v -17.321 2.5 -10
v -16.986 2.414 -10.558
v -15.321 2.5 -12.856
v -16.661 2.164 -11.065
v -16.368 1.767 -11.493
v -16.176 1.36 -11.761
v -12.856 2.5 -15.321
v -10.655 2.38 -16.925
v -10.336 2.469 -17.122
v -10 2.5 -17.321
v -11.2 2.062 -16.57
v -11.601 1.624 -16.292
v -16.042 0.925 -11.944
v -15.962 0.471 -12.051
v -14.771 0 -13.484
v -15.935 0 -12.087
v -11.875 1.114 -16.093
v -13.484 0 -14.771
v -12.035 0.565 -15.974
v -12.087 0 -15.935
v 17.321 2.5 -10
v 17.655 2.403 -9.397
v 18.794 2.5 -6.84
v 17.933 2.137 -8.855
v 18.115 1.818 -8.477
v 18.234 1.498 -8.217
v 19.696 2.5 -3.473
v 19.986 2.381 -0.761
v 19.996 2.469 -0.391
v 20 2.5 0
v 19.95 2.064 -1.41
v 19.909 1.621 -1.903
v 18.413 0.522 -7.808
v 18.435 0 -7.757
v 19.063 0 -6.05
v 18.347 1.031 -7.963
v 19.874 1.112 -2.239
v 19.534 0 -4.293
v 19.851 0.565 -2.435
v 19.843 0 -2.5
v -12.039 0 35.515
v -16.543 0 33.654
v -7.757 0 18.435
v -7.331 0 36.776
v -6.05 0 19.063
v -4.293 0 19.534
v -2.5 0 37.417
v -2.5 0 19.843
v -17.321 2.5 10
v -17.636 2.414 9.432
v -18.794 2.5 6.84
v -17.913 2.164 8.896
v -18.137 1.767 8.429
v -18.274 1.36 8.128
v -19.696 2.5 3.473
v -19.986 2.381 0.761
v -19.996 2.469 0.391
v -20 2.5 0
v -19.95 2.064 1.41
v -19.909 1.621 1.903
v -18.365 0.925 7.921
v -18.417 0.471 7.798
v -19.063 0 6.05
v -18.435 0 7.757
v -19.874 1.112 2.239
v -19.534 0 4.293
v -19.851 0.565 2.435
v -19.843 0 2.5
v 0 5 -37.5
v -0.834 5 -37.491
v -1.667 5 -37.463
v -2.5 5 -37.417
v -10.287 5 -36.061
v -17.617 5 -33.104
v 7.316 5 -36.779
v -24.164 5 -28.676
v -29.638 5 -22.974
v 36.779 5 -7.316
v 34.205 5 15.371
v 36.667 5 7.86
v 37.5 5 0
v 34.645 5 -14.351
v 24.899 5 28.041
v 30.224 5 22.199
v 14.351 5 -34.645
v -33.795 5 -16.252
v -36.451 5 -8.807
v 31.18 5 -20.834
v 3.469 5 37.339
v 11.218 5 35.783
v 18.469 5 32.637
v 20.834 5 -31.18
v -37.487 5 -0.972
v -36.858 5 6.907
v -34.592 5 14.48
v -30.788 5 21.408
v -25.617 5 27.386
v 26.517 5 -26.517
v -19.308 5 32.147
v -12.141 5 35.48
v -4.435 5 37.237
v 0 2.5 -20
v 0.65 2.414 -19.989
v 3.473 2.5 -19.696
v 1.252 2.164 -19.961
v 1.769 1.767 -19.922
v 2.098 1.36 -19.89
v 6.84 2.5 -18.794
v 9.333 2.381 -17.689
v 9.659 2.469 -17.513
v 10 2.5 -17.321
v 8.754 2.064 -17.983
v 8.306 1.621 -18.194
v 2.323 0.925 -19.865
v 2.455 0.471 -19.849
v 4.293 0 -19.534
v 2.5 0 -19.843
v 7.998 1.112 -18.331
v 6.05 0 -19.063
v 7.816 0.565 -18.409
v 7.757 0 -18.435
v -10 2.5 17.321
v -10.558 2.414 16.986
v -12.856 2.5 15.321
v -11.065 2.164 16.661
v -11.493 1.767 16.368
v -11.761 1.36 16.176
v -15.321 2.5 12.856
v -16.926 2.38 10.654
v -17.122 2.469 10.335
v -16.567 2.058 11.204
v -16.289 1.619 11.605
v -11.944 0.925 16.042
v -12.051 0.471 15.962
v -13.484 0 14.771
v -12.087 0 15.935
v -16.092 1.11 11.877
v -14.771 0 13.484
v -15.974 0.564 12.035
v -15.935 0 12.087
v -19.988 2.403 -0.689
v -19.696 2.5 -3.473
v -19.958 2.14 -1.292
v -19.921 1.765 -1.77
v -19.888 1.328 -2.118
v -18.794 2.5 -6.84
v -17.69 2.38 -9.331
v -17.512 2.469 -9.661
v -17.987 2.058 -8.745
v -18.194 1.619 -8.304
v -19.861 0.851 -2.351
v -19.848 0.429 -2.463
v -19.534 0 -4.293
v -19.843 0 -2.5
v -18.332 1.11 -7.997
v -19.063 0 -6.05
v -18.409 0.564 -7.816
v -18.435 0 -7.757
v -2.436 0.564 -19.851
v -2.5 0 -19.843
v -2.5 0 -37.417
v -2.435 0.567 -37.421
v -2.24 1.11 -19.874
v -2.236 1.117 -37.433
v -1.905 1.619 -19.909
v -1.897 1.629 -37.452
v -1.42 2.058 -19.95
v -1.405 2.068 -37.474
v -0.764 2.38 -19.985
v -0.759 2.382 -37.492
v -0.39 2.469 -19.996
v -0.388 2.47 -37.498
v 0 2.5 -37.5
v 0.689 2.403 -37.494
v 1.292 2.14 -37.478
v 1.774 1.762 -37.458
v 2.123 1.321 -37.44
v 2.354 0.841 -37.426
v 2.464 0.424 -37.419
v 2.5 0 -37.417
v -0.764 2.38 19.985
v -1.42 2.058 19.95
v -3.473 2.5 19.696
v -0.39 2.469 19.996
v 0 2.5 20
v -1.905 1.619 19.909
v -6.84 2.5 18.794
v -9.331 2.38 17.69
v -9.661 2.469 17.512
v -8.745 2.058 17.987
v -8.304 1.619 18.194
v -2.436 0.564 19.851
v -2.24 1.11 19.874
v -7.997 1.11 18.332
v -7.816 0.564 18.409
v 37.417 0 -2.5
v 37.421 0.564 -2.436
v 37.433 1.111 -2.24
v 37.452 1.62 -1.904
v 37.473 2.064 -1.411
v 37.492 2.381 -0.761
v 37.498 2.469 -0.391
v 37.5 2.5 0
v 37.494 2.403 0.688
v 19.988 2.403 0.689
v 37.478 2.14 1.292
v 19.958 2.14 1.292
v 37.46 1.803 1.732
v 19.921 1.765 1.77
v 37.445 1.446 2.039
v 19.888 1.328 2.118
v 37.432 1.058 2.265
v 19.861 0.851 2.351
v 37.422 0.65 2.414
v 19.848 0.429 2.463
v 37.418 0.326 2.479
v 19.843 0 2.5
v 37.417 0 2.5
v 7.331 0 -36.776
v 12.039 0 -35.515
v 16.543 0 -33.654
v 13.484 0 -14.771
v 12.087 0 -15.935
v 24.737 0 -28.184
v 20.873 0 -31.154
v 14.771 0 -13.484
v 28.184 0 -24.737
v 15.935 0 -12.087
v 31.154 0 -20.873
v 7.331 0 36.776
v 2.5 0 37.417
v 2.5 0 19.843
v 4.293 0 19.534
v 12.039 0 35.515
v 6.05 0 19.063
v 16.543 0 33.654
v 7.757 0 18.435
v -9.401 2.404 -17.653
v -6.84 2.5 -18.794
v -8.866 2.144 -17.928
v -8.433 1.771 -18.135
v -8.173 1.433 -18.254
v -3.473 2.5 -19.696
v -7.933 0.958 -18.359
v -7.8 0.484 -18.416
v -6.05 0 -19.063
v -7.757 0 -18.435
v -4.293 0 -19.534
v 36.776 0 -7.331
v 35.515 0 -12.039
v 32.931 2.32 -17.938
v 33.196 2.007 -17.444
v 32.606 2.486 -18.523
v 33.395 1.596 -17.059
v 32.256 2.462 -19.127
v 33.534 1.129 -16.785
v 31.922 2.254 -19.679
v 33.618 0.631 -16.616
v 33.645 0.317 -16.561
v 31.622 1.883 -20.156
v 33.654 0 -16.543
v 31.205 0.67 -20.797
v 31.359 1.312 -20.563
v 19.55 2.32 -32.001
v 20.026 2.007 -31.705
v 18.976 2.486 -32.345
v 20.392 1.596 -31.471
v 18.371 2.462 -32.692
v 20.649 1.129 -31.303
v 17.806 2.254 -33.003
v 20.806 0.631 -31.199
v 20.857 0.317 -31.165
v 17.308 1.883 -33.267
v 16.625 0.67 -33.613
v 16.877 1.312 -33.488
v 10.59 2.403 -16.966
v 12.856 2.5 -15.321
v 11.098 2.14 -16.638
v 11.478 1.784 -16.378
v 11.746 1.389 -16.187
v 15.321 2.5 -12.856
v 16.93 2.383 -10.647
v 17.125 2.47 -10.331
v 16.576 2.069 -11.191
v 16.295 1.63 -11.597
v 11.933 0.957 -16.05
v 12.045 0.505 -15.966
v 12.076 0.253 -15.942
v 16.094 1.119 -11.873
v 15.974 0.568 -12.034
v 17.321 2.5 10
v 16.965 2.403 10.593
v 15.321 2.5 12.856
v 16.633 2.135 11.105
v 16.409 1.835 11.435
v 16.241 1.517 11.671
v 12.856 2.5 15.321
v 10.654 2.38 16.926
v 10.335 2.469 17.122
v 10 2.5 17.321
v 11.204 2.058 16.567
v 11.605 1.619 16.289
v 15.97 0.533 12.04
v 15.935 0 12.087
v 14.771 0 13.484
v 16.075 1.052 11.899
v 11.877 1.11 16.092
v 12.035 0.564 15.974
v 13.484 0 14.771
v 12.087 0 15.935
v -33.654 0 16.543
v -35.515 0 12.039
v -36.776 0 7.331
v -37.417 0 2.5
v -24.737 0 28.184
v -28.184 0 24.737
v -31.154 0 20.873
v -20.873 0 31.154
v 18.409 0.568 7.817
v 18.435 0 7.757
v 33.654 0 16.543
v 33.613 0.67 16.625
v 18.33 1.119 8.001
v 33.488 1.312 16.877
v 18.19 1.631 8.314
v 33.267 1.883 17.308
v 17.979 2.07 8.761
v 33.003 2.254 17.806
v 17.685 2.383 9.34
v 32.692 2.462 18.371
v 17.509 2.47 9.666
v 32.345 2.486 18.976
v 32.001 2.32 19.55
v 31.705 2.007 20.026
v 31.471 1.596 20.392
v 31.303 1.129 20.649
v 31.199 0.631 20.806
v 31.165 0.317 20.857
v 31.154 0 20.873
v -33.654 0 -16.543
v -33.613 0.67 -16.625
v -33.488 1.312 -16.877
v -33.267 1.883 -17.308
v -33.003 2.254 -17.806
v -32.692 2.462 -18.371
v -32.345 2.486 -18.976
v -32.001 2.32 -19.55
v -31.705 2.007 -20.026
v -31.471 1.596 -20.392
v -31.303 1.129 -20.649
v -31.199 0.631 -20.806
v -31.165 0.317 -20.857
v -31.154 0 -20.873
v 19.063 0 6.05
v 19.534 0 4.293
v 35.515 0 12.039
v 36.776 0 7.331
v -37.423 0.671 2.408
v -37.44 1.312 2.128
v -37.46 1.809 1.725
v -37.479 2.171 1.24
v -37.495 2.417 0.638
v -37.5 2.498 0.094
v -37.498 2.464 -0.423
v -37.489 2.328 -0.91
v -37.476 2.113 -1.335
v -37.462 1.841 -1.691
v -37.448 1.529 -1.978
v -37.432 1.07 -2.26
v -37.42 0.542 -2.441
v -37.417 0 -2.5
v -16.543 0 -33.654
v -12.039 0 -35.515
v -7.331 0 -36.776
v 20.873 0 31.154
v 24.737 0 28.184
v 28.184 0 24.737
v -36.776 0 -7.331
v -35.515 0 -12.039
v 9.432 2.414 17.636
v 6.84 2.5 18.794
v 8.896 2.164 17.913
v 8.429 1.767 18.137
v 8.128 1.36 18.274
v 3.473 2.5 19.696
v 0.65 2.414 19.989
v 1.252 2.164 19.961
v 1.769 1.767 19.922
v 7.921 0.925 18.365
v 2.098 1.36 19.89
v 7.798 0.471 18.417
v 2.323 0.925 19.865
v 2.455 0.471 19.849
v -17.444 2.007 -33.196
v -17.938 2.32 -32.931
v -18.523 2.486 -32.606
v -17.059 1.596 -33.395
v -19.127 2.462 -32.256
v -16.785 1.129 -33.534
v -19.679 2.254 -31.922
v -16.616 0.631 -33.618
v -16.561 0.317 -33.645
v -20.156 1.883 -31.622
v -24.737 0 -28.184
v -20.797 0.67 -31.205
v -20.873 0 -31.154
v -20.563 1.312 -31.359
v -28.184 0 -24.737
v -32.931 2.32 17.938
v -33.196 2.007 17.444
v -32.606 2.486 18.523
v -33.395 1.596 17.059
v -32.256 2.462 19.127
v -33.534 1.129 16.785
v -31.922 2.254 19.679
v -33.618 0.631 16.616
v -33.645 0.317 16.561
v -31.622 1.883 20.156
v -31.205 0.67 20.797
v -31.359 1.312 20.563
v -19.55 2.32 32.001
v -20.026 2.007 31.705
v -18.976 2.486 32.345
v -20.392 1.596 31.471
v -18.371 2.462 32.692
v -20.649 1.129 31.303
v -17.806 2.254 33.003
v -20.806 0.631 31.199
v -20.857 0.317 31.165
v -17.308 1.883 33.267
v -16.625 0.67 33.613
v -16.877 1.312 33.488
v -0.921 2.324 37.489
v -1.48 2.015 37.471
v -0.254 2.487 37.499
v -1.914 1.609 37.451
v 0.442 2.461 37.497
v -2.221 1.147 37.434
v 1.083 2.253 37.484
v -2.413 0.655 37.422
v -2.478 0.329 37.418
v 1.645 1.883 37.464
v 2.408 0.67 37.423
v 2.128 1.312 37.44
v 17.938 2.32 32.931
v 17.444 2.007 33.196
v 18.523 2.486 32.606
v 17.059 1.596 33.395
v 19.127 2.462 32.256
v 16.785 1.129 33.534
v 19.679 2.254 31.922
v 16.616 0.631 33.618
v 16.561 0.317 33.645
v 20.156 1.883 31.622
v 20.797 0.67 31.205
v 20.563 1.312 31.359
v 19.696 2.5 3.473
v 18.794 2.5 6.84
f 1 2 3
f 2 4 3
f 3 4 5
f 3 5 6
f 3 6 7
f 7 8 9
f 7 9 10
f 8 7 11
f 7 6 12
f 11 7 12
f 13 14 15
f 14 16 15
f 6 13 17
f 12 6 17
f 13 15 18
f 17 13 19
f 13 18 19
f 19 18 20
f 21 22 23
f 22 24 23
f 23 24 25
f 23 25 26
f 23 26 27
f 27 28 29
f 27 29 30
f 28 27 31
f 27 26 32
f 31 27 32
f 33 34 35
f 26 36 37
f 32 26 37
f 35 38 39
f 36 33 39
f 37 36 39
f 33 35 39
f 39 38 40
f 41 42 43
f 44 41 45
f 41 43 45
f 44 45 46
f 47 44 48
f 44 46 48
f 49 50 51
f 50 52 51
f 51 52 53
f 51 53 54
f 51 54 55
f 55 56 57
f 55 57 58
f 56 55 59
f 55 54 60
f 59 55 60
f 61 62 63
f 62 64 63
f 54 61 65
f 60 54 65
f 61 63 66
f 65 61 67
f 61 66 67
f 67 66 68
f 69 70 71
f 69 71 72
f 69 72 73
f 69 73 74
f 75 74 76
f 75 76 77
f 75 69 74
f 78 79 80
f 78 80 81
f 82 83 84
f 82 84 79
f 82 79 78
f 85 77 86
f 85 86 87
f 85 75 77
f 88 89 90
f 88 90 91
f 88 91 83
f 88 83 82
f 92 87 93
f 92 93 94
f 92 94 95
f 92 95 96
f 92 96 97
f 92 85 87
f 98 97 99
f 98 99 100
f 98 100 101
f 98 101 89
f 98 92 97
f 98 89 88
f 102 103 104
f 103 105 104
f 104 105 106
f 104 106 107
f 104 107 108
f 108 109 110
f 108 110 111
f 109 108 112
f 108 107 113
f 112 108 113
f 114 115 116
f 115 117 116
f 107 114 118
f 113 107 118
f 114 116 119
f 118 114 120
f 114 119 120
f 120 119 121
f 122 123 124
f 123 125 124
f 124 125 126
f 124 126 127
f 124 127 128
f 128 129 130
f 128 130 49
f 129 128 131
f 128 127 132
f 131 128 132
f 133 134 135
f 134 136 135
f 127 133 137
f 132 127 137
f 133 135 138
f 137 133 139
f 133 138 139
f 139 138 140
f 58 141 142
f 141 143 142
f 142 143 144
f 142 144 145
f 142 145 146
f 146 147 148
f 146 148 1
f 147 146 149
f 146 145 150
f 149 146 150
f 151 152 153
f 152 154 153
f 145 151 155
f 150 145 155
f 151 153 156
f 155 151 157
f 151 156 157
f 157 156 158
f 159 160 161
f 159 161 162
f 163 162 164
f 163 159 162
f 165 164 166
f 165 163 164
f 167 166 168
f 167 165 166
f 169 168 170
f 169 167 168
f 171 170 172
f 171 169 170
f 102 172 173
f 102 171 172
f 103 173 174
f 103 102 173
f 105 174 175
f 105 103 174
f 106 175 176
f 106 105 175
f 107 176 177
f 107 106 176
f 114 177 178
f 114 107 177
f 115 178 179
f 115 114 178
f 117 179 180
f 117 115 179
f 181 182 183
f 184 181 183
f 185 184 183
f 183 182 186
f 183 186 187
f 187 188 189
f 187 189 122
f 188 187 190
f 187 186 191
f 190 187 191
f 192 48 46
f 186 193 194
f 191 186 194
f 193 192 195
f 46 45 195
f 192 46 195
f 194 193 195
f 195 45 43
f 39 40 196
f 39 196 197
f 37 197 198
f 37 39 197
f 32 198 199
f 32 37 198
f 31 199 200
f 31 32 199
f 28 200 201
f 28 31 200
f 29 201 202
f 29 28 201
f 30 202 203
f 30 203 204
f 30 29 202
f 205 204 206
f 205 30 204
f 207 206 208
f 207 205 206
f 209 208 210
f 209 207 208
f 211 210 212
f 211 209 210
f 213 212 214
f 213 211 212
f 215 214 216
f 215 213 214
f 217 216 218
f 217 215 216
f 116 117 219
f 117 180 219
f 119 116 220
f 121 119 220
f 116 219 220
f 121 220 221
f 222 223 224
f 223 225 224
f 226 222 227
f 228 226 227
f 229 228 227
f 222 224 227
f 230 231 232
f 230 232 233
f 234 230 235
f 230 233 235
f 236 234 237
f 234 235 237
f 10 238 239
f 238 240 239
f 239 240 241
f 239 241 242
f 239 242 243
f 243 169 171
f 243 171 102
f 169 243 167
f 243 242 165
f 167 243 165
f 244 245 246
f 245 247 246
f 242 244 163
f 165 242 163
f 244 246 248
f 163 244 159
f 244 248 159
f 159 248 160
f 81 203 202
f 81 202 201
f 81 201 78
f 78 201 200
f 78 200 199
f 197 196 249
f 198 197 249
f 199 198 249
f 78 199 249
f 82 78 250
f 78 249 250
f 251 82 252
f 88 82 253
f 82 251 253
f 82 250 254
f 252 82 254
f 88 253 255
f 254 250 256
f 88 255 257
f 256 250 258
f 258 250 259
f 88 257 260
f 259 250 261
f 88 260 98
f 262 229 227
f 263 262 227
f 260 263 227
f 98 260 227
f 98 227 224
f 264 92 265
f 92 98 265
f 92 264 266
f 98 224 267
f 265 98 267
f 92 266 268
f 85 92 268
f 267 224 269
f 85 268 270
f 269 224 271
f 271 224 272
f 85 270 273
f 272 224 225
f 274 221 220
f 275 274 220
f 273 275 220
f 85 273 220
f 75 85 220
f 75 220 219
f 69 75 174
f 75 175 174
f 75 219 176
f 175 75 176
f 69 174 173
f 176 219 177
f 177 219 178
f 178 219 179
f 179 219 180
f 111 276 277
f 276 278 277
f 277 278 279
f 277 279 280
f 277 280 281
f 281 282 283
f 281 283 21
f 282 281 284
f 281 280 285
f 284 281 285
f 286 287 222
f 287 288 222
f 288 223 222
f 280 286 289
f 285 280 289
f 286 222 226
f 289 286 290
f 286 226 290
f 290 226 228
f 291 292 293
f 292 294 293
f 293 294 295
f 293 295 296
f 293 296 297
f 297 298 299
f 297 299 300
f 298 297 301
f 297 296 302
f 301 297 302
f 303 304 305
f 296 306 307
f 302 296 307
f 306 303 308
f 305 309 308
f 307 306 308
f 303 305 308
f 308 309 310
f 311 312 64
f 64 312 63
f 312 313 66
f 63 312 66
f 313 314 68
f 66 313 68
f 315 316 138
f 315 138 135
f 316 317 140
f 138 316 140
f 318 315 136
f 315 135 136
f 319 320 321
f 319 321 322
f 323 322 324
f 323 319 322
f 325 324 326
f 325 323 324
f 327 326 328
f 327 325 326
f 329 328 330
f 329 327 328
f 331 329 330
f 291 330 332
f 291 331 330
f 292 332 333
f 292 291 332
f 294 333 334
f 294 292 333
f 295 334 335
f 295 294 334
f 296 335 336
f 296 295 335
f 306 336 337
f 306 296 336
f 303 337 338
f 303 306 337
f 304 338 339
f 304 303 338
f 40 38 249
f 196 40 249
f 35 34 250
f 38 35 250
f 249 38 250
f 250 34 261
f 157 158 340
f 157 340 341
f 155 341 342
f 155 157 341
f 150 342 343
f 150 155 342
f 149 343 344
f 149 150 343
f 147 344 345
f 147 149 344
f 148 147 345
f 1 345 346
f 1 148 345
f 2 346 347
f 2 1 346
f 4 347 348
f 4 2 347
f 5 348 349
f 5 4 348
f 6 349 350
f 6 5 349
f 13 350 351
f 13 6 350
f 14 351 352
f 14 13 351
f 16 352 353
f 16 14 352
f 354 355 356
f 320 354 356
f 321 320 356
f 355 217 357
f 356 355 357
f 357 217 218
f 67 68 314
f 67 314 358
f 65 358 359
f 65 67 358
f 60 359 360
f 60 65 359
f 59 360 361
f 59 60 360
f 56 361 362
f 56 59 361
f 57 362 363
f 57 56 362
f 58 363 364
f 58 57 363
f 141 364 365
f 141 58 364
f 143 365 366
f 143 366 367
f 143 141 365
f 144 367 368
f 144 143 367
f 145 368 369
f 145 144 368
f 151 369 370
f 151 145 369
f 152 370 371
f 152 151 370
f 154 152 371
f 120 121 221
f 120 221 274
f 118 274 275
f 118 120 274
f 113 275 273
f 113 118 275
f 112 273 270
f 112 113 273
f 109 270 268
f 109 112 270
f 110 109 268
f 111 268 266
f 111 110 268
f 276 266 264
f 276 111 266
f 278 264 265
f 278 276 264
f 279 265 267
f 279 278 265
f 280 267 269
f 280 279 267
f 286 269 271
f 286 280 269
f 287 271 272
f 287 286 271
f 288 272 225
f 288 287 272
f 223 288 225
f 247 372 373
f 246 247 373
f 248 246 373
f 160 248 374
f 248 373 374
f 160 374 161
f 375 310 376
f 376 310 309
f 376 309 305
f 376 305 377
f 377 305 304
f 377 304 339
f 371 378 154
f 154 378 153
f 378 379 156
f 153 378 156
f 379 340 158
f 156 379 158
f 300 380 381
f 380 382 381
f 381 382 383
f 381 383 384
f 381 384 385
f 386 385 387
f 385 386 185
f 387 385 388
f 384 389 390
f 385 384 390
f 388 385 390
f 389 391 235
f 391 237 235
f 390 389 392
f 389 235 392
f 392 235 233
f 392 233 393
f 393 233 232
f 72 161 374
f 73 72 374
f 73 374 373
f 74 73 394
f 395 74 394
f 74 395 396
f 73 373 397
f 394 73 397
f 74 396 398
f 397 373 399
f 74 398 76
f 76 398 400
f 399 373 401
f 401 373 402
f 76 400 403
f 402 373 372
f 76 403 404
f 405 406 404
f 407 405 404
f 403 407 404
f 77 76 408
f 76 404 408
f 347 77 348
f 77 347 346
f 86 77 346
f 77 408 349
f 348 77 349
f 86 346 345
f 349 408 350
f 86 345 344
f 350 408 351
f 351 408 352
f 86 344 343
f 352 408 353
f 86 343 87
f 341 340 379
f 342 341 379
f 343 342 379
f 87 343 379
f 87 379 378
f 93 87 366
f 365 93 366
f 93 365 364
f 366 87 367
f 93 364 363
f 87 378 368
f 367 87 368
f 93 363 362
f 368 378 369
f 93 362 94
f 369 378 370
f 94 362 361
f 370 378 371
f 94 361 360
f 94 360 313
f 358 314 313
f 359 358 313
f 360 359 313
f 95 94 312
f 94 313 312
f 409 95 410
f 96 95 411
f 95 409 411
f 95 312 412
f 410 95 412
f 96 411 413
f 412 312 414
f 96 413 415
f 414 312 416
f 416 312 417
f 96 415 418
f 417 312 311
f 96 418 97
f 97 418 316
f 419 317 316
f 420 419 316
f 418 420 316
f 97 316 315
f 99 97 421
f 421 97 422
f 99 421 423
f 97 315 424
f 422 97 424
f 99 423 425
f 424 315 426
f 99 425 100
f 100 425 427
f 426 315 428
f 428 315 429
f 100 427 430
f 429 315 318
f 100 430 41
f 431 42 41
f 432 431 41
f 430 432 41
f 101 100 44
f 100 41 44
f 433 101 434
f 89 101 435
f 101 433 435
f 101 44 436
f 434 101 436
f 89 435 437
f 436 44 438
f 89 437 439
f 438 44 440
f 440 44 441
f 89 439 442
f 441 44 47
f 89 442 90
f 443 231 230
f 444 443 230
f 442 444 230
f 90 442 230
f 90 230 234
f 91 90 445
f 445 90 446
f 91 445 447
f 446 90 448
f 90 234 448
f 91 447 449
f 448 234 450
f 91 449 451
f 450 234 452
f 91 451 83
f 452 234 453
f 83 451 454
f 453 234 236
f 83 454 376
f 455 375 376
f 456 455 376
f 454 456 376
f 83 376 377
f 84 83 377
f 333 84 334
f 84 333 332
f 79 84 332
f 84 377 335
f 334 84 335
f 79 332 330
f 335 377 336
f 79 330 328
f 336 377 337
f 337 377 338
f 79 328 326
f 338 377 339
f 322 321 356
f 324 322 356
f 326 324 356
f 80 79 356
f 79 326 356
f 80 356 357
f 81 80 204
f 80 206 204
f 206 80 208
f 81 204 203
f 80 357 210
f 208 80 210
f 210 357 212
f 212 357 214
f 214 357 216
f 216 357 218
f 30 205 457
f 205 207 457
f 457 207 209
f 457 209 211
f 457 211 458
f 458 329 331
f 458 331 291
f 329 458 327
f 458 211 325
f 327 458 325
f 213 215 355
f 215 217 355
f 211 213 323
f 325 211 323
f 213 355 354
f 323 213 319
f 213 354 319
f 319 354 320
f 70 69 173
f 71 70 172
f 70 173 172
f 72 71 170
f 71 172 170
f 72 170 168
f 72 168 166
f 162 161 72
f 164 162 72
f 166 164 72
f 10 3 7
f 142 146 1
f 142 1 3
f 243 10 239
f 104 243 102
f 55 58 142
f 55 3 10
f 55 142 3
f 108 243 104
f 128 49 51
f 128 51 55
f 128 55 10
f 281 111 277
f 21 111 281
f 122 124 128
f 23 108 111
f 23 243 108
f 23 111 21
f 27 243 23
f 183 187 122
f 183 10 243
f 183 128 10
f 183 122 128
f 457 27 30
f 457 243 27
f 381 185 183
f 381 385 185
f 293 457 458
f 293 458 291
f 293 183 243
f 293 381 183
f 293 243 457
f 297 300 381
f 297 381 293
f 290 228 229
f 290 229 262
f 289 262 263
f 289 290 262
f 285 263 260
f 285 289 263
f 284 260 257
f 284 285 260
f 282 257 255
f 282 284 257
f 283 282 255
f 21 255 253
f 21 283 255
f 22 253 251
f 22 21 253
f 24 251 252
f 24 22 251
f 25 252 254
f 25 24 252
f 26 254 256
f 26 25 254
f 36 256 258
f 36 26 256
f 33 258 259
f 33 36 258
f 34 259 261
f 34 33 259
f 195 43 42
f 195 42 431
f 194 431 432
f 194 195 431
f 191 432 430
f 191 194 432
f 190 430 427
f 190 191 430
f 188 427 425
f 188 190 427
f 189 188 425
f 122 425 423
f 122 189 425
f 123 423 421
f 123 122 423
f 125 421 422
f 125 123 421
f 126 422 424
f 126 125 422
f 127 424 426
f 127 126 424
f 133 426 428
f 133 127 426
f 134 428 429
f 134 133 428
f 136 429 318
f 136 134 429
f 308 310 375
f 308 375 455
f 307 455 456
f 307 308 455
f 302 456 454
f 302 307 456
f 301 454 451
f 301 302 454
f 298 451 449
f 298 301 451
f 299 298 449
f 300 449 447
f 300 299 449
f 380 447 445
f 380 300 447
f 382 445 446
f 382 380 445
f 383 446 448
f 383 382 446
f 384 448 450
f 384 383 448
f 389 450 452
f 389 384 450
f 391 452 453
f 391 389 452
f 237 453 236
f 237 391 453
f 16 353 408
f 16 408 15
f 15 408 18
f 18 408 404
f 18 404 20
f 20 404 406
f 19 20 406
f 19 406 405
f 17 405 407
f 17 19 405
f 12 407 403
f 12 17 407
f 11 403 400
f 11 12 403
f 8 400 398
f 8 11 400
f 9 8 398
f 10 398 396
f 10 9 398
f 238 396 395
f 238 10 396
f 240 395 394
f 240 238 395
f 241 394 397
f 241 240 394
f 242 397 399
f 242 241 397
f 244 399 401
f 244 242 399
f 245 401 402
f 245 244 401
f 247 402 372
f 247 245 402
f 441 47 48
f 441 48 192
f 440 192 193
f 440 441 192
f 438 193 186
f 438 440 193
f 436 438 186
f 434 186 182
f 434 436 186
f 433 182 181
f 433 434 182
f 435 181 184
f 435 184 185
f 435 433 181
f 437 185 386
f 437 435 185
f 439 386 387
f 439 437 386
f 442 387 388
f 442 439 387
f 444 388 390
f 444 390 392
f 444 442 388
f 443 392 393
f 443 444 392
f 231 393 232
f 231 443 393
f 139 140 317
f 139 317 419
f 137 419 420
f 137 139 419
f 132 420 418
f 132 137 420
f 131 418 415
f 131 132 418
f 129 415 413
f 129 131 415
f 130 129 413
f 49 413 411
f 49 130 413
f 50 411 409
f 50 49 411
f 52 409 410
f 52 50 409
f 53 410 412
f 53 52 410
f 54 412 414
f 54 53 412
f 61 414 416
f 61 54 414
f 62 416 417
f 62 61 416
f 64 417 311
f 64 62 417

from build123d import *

# Parameters (mm, degrees)
SKETCH_1_W               = 2.5
SKETCH_1_H               = 60
EXTRUDE_1_DEPTH          = 5
EXTRUDE_2_DEPTH          = 5
CUT_EXTRUDE_START        = -60
SKETCH_4_R               = 2.5
CUT_EXTRUDE_1_DEPTH      = 60
PATTERN_CIRCULAR_2_COUNT = 12
SKETCH_5_R               = 20
CUT_EXTRUDE_2_DEPTH      = 2.5


with BuildPart() as part:
    # Эскиз1 → Повернуть2 (revolve)
    with BuildSketch(Plane(origin=(0, 0, 0), x_dir=(1, 0, 0), z_dir=(0, 1, 0)), mode=Mode.PRIVATE) as revolve_2_sk:
        with Locations((-1.25, 30)):
            Rectangle(SKETCH_1_W, SKETCH_1_H)
    revolve(revolve_2_sk.sketch.rotate(Axis((0, 0, 37.5), (0, 0, -1)), 180), axis=Axis((0, 0, 37.5), (0, 0, -1)))

    # Эскиз1<5> → Бобышка-Вытянуть1 (add)
    with BuildSketch(Plane(origin=(0, 0, 0), x_dir=(1, 0, 0), z_dir=(0, 1, 0))):
        with BuildLine():
            ThreePointArc((20, 0), (-13.228756555, -15), (-2.5, 19.843134833))
            Line((-2.5, 19.843134833), (-2.5, 37.416573868))
            ThreePointArc((-2.5, 37.416573868), (-25.617376915, -27.386127875), (37.5, 0))
            ThreePointArc((37.5, 0), (26.516504294, 26.516504294), (0, 37.5))
            Line((0, 37.5), (0, 20))
            ThreePointArc((0, 20), (14.142135624, 14.142135624), (20, 0))
        make_face()
        with BuildLine():
            Line((-2.5, 37.416573868), (-2.5, 19.843134833))
            ThreePointArc((-2.5, 19.843134833), (-1.252458251, 19.960745185), (0, 20))
            Line((0, 20), (0, 37.5))
            ThreePointArc((0, 37.5), (-1.250695798, 37.479137664), (-2.5, 37.416573868))
        make_face()
    extrude(amount=EXTRUDE_1_DEPTH)

    # Эскиз1<6> → Бобышка-Вытянуть2 (add)
    with BuildSketch(Plane(origin=(0, 0, 0), x_dir=(1, 0, 0), z_dir=(0, 1, 0))):
        with BuildLine():
            Line((0, 0), (-2.5, 0))
            Line((-2.5, 0), (-2.5, 19.843134833))
            ThreePointArc((-2.5, 19.843134833), (-13.228756555, -15), (20, 0))
            ThreePointArc((20, 0), (14.142135624, 14.142135624), (0, 20))
            Line((0, 20), (0, 0))
        make_face()
        with BuildLine():
            Line((-2.5, 19.843134833), (-2.5, 0))
            Line((-2.5, 0), (0, 0))
            Line((0, 0), (0, 20))
            ThreePointArc((0, 20), (-1.252458251, 19.960745185), (-2.5, 19.843134833))
        make_face()
    extrude(amount=EXTRUDE_2_DEPTH)

    # Эскиз4 → Вырез-Вытянуть1 (cut)
    with BuildSketch(Plane(origin=(0, 0, -60), x_dir=(-1, 0, 0), z_dir=(0, 0, -1)).offset(CUT_EXTRUDE_START)):
        Circle(SKETCH_4_R)
    cut_extrude_1 = extrude(amount=CUT_EXTRUDE_1_DEPTH, mode=Mode.SUBTRACT)

    # Круговой массив2: Вырез-Вытянуть1 ×12 about axis
    pattern_circular_2_axis = Axis((0, 29.957095594, 0), (0, -1, 0))
    for i in range(1, PATTERN_CIRCULAR_2_COUNT):
        add(cut_extrude_1.rotate(pattern_circular_2_axis, i * 360 / PATTERN_CIRCULAR_2_COUNT), mode=Mode.SUBTRACT)

    # Эскиз5 → Вырез-Вытянуть2 (cut)
    with BuildSketch(Plane.XZ):
        Circle(SKETCH_5_R)
    extrude(amount=-CUT_EXTRUDE_2_DEPTH, mode=Mode.SUBTRACT)


solid = part.part
